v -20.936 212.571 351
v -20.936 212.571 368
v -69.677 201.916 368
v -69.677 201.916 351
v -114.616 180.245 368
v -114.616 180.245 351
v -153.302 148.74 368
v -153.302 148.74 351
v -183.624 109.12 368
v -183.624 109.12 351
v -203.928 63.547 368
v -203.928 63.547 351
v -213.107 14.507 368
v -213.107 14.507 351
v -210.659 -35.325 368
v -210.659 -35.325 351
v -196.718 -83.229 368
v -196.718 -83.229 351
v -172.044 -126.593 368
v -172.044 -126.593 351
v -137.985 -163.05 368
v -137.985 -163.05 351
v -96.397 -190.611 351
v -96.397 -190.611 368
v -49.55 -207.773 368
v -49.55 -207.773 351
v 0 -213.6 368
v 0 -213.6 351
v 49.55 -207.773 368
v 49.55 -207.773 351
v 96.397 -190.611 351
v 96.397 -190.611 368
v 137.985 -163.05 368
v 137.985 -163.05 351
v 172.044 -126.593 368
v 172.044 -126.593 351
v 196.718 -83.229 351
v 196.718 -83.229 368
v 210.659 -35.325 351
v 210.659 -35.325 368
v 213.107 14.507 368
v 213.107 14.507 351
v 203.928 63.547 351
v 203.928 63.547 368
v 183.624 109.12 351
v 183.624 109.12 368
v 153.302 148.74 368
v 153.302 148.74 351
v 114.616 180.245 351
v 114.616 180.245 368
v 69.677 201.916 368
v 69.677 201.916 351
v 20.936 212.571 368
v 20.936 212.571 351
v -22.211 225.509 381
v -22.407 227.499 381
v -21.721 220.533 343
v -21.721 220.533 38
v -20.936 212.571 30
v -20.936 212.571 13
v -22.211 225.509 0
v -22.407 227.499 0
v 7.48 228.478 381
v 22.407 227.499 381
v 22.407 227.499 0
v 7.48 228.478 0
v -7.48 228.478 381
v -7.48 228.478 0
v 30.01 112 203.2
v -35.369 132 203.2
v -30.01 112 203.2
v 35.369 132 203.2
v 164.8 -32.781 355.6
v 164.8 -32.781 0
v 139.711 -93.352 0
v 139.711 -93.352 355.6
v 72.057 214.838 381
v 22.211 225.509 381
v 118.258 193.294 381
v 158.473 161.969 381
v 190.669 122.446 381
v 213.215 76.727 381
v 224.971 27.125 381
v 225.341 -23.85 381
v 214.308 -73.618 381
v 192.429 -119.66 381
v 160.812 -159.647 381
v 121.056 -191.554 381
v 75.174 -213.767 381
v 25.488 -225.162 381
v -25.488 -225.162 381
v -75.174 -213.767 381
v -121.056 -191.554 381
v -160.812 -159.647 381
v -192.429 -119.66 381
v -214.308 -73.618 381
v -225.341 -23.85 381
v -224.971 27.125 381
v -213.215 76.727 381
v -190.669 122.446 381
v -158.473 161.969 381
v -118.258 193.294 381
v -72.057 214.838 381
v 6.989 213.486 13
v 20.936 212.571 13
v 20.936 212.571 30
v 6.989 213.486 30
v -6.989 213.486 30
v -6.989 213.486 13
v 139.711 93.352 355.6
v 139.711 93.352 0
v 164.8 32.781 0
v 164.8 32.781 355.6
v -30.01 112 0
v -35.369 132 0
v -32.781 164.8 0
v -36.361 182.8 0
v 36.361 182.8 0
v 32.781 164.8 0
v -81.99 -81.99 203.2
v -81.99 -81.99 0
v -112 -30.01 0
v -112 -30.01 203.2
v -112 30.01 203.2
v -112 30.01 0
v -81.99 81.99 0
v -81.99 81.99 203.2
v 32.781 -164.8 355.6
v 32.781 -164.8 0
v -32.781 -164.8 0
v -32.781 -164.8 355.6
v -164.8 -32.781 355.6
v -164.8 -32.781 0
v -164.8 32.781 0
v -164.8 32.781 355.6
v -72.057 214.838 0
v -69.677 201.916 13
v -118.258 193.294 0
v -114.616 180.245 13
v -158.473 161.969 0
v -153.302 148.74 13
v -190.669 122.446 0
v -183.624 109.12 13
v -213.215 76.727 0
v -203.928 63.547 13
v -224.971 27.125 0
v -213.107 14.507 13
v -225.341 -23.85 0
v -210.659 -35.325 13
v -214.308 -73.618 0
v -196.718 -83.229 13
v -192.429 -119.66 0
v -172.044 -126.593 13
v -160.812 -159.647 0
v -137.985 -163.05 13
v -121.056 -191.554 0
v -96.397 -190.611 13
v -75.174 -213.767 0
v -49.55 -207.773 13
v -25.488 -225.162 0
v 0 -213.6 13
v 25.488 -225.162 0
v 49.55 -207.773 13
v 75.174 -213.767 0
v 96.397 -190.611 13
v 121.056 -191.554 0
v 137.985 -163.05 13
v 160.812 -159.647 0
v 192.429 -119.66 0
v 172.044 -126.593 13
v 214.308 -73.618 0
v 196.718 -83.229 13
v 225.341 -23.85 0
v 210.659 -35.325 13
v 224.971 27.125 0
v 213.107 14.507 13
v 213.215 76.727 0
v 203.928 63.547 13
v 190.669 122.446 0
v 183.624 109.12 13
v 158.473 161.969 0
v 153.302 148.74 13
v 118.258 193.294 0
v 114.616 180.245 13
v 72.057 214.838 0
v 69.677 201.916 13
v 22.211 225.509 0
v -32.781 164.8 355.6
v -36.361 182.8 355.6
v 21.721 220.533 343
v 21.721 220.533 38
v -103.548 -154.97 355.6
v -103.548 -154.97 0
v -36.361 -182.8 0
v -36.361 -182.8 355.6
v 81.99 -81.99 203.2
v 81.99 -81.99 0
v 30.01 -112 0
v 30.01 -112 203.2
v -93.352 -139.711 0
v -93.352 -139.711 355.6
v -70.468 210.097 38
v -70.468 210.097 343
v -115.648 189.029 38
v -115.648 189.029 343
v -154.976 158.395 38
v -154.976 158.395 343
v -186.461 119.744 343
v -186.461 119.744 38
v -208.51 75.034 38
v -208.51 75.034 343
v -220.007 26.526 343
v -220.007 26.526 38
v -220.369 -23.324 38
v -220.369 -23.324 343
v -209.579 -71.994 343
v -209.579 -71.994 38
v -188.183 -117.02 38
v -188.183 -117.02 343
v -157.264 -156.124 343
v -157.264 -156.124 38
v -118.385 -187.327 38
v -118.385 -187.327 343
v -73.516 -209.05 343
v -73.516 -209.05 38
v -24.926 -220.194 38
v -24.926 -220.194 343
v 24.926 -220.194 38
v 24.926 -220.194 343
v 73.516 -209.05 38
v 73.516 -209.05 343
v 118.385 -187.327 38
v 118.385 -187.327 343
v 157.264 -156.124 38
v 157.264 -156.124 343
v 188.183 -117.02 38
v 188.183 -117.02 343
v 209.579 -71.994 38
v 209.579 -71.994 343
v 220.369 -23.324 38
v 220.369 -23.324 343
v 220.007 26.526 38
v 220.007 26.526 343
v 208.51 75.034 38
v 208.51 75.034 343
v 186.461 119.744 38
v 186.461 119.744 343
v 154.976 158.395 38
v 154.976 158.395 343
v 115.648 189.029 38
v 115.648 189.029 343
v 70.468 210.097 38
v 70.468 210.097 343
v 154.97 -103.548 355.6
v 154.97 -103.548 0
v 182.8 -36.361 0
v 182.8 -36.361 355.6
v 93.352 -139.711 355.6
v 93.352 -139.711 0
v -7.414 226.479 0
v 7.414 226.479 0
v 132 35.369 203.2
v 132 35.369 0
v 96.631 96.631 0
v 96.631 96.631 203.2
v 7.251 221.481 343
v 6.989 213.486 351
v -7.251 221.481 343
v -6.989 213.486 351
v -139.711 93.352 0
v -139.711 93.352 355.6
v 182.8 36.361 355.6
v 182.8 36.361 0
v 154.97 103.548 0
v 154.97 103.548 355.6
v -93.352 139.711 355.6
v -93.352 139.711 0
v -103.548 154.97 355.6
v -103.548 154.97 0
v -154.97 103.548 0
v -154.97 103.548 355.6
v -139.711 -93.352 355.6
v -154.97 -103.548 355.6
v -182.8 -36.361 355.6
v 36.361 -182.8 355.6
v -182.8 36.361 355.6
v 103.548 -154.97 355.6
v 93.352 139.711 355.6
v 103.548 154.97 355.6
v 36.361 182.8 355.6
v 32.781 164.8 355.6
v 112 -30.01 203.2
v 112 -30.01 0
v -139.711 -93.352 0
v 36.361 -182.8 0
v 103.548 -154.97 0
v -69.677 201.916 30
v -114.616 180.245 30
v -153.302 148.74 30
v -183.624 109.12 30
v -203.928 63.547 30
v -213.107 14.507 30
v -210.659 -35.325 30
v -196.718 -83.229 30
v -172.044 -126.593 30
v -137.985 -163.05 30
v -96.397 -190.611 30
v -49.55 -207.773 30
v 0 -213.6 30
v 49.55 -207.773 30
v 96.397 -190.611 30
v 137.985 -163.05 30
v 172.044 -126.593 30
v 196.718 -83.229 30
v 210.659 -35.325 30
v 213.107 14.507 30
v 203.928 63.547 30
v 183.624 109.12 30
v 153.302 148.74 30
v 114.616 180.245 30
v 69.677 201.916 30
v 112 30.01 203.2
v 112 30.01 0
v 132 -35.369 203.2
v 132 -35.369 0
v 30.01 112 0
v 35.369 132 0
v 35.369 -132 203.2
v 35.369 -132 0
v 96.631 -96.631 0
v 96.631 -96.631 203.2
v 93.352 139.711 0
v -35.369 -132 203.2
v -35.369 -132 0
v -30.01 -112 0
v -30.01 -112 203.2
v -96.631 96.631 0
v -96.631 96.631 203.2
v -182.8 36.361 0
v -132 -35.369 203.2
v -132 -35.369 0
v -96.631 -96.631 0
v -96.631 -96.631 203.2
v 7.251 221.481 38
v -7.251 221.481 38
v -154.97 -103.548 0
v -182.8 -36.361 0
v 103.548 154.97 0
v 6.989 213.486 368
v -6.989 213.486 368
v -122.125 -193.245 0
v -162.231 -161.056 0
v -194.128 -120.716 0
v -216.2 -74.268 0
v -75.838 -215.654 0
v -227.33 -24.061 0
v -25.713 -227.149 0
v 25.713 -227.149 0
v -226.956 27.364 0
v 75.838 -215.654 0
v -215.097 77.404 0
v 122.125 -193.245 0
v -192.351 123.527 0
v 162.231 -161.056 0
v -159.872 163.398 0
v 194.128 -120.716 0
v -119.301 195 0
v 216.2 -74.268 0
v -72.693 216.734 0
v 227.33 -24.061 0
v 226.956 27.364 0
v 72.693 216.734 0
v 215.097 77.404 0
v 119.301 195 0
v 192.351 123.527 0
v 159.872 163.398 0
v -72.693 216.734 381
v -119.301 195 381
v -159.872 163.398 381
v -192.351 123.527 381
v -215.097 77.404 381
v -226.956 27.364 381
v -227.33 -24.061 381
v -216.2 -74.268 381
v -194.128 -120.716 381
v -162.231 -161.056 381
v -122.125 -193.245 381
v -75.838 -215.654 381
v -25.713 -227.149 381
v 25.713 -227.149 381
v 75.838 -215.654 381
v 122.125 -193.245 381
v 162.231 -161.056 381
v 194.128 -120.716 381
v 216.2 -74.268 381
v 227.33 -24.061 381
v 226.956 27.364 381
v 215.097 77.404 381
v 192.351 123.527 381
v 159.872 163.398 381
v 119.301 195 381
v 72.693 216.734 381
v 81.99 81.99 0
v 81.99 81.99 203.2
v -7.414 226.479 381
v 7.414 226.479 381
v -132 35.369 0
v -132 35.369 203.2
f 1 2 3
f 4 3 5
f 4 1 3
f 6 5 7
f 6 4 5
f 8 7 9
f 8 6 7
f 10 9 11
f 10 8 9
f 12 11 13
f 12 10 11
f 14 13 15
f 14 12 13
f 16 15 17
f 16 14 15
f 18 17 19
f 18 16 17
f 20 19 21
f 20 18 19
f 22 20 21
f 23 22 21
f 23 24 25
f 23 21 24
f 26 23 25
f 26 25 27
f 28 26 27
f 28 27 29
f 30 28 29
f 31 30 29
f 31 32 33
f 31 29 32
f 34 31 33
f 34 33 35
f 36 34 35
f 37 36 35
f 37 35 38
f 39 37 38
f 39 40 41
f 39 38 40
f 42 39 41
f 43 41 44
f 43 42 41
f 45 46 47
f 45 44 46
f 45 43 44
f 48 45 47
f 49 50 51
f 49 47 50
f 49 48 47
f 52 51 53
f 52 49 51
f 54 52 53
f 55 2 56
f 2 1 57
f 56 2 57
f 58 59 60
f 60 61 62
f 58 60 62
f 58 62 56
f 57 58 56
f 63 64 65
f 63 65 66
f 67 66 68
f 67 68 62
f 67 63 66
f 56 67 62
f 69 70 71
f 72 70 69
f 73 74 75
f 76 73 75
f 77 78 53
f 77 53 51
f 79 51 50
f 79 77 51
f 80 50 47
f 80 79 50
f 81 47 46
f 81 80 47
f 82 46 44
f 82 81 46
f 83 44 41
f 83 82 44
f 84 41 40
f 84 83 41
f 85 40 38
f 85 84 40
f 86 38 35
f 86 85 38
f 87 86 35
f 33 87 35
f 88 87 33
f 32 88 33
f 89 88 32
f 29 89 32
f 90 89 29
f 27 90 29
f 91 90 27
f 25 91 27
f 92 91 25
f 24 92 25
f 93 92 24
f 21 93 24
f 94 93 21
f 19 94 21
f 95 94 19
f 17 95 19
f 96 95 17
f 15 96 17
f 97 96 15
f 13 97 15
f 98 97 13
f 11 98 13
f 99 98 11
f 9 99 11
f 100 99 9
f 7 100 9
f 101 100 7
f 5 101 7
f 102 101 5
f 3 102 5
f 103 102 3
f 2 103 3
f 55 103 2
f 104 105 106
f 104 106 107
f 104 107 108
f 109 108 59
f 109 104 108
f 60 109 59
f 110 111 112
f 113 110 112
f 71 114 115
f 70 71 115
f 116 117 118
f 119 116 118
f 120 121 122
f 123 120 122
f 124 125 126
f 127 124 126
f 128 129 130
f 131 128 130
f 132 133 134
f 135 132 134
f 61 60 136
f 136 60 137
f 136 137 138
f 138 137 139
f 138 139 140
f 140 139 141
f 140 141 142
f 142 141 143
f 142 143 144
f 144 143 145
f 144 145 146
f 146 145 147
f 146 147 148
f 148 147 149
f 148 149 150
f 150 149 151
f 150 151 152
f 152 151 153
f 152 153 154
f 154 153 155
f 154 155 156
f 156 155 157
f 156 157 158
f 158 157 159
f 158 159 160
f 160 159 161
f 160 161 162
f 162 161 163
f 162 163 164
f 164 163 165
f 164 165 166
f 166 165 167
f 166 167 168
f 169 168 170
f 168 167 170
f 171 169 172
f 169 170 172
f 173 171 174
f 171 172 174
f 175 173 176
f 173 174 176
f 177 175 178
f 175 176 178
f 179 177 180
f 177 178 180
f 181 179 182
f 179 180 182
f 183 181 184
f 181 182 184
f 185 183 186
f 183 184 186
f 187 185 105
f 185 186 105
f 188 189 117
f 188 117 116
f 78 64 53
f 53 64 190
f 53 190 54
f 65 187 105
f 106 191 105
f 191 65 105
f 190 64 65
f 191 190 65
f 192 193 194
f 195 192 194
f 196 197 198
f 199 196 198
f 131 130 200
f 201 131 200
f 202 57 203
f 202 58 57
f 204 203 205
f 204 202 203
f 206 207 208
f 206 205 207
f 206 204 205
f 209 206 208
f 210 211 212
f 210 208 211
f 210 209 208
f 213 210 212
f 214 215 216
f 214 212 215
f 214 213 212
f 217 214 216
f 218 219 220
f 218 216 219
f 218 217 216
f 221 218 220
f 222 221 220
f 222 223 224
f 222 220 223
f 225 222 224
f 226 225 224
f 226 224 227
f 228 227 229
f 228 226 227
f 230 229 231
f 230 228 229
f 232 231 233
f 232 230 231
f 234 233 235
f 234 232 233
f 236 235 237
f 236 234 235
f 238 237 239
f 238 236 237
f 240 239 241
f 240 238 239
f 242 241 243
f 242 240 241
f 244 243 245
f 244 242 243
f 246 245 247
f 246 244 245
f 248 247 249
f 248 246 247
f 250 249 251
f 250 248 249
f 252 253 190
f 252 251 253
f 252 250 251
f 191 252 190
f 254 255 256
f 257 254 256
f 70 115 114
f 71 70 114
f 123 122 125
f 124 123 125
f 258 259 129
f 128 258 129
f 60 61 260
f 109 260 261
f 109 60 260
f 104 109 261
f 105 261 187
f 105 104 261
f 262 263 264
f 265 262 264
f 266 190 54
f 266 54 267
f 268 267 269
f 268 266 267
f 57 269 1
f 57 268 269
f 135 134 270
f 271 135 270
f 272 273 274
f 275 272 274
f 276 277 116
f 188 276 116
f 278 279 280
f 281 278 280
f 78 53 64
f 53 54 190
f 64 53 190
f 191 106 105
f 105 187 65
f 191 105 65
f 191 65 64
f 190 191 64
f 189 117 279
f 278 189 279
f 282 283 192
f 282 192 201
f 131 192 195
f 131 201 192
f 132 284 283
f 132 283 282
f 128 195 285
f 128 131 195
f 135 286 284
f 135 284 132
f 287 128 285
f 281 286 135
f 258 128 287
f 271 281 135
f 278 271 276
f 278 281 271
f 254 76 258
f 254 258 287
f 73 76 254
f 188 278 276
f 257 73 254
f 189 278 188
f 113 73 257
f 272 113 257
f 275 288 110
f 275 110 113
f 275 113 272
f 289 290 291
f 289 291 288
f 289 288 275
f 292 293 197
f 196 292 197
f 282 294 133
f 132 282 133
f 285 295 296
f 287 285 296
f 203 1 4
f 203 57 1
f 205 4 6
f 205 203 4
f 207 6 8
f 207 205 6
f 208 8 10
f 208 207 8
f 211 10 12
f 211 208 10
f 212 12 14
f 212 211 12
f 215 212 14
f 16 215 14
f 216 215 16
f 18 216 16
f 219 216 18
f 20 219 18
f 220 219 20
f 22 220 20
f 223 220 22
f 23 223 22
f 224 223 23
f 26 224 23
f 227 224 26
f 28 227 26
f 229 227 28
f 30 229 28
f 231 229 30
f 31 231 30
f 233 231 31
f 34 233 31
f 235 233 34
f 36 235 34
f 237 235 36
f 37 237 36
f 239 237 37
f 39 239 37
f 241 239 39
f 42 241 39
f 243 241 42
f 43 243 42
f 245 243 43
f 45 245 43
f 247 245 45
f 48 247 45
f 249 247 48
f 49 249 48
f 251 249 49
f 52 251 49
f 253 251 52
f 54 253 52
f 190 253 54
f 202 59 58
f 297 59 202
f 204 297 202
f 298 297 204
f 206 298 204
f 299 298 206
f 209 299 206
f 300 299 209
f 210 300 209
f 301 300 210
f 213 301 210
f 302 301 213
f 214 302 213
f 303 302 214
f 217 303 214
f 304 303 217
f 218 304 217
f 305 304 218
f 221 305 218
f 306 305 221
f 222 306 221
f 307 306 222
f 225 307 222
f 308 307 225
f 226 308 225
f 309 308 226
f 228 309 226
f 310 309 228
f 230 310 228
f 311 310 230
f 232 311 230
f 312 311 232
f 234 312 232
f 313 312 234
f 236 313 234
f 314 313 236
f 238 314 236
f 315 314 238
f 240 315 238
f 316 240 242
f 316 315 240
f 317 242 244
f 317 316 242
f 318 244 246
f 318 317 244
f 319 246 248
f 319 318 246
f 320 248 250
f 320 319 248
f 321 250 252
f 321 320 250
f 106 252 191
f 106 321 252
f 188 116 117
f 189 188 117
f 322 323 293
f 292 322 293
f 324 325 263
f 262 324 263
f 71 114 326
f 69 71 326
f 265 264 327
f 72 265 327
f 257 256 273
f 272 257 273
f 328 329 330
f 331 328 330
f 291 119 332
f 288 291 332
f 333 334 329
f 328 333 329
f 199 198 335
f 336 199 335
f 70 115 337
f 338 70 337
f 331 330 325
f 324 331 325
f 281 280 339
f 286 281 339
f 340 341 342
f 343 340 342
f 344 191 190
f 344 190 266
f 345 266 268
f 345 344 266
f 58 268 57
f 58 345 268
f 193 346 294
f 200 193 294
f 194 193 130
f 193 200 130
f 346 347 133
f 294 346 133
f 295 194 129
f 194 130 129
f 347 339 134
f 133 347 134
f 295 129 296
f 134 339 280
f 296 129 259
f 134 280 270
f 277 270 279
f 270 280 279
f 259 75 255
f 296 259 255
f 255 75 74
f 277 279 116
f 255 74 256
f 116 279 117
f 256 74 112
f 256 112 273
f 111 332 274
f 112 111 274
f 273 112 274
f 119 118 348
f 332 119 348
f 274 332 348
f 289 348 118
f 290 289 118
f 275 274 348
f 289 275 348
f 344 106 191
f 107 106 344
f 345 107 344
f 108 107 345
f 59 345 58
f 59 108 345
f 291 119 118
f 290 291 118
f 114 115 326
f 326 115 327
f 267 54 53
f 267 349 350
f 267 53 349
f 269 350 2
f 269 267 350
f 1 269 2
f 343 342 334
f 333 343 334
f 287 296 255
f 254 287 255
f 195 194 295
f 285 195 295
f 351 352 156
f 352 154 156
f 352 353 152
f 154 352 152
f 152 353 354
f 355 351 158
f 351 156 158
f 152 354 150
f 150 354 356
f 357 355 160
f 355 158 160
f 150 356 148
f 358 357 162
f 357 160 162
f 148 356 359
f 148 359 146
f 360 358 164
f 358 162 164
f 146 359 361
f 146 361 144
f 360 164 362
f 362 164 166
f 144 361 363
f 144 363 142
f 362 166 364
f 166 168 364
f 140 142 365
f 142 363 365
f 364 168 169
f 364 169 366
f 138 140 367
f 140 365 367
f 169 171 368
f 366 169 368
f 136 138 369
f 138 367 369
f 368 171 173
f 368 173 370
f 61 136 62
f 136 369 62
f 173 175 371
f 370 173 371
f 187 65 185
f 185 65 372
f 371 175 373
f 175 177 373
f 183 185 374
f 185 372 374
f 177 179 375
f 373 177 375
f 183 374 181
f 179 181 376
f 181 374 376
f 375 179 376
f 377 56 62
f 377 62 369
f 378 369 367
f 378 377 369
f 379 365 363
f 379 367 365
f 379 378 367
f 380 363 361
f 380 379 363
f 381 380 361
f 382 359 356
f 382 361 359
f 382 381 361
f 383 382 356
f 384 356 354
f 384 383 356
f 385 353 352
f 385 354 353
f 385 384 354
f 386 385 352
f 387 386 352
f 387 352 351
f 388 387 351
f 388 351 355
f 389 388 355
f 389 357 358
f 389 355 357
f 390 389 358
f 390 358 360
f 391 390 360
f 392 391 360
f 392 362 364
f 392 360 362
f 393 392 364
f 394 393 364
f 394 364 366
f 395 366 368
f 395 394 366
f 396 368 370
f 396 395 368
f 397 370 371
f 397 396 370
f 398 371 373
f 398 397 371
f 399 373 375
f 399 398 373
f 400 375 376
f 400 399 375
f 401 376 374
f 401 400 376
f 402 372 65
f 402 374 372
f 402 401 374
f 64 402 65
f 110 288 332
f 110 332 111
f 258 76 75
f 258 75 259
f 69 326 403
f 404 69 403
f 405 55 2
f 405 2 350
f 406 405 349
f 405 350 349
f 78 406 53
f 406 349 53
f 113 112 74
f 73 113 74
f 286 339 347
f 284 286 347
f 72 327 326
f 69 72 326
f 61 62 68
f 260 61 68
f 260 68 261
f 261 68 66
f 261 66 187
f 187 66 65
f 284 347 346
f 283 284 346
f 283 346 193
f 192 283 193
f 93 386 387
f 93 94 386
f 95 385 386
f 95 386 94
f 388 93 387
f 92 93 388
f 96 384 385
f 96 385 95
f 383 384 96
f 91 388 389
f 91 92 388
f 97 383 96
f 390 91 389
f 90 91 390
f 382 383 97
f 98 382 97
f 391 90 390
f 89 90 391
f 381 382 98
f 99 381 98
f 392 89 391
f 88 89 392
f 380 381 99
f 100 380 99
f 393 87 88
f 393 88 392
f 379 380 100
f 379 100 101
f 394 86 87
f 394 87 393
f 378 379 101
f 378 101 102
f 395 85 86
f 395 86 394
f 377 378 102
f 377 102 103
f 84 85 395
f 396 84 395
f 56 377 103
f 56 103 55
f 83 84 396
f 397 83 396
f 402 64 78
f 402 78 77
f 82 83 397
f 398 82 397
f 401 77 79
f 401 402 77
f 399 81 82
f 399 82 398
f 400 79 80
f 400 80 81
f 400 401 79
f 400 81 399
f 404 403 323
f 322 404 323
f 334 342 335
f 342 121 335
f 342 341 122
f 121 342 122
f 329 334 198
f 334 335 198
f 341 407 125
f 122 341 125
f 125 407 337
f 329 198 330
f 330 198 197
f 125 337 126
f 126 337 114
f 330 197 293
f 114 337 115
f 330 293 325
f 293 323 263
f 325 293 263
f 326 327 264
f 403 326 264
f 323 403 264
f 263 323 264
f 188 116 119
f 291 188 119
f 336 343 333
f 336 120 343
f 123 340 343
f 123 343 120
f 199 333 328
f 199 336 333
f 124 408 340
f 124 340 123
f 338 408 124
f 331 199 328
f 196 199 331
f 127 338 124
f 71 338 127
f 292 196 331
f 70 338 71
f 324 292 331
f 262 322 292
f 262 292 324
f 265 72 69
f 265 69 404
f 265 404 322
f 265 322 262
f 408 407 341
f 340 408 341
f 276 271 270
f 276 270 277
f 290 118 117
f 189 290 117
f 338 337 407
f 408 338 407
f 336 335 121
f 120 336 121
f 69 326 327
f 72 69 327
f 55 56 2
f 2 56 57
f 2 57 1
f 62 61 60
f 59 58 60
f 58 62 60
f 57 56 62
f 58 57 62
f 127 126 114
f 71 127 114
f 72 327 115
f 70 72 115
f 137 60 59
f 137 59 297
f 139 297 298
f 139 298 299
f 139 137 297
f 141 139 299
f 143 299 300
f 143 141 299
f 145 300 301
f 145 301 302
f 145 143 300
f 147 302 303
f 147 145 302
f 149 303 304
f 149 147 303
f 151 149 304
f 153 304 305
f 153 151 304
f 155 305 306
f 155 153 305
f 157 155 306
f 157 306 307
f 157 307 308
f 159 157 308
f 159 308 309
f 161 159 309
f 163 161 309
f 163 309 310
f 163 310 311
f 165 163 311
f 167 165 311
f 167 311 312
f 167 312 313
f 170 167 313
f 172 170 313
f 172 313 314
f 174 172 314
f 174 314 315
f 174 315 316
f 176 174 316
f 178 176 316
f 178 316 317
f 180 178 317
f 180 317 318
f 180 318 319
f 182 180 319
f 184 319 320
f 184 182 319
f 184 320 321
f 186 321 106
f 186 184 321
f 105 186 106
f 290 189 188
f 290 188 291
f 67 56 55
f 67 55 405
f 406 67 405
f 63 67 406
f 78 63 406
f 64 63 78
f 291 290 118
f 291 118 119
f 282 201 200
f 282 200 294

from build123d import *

# Parameters (mm, degrees)
F1_DEPTH  = 381
F2_DEPTH  = 381
F3_W      = 113.4495702038
F3_H      = 429.2523376644
F5_SIZE   = 13
F5_2_SIZE = 13
F7_DEPTH  = 355.6
F8_DEPTH  = 355.6
F10_DEPTH = 203.2
F11_DEPTH = 203.2


with BuildPart() as f1:
    # F0 (on Top) → F1 (new body)
    with BuildSketch(Plane.XY):
        Polygon((20.4468153369, 207.6), (23.2045746309, 235.6), (-23.2045746309, 235.6), (-20.4468153369, 207.6), align=None)
    extrude(amount=F1_DEPTH)


with BuildPart() as f2:
    # F0 (on Top) → F2 (new body, through all)
    with BuildSketch(Plane.XY):
        Polygon((235.6, 23.2045746309), (226.546024126, 68.7219851031), (208.7860115933, 111.5984482274), (183.0024697236, 150.1862455715), (150.1862455715, 183.0024697236), (111.5984482274, 208.7860115933), (68.7219851031, 226.546024126), (23.2045746309, 235.6), (20.4468153369, 207.6), (60.5546863641, 199.6220484234), (98.3354747538, 183.9727334753), (132.3372859959, 161.2534495528), (161.2534495528, 132.3372859959), (183.9727334753, 98.3354747538), (199.6220484234, 60.5546863641), (207.6, 20.4468153369), (207.6, -20.4468153369), (199.6220484234, -60.5546863641), (183.9727334753, -98.3354747538), (161.2534495528, -132.3372859959), (132.3372859959, -161.2534495528), (98.3354747538, -183.9727334753), (60.5546863641, -199.6220484234), (20.4468153369, -207.6), (-20.4468153369, -207.6), (-60.5546863641, -199.6220484234), (-98.3354747538, -183.9727334753), (-132.3372859959, -161.2534495528), (-161.2534495528, -132.3372859959), (-183.9727334753, -98.3354747538), (-199.6220484234, -60.5546863641), (-207.6, -20.4468153369), (-207.6, 20.4468153369), (-199.6220484234, 60.5546863641), (-183.9727334753, 98.3354747538), (-161.2534495528, 132.3372859959), (-132.3372859959, 161.2534495528), (-98.3354747538, 183.9727334753), (-60.5546863641, 199.6220484234), (-20.4468153369, 207.6), (-23.2045746309, 235.6), (-68.7219851031, 226.546024126), (-111.5984482274, 208.7860115933), (-150.1862455715, 183.0024697236), (-183.0024697236, 150.1862455715), (-208.7860115933, 111.5984482274), (-226.546024126, 68.7219851031), (-235.6, 23.2045746309), (-235.6, -23.2045746309), (-226.546024126, -68.7219851031), (-208.7860115933, -111.5984482274), (-183.0024697236, -150.1862455715), (-150.1862455715, -183.0024697236), (-111.5984482274, -208.7860115933), (-68.7219851031, -226.546024126), (-23.2045746309, -235.6), (23.2045746309, -235.6), (68.7219851031, -226.546024126), (111.5984482274, -208.7860115933), (150.1862455715, -183.0024697236), (183.0024697236, -150.1862455715), (208.7860115933, -111.5984482274), (226.546024126, -68.7219851031), (235.6, -23.2045746309), align=None)
    extrude(amount=F2_DEPTH)


with BuildPart() as f4_tool:
    # F3 (on Front) → F4 (revolve)
    with BuildSketch(Plane.XZ):
        with Locations((-285.3247851019, 178.768913353)):
            Rectangle(F3_W, F3_H)
        Polygon((-213.6, 30), (-213.6, -35.8572554791), (-190.5178142795, -35.8572554791), (-190.5178142795, 393.3950821852), (-213.6, 393.3950821852), (-213.6, 351), (-221.6, 343), (-221.6, 38), align=None)
    revolve(axis=Axis((0, 0, 198.5659504), (0, 0, 1)))


with BuildPart() as f1_1:
    add(f1.part)

    # F4: cut by f4_tool
    add(f4_tool.part, mode=Mode.SUBTRACT)

    # F5#2
    f5_2_edges = [f1_1.edges().sort_by_distance(p)[0] for p in [
        (0, 213.6, 381),
        (0, 213.6, 0),
    ]]
    chamfer(f5_2_edges, length=F5_2_SIZE)


with BuildPart() as f2_1:
    add(f2.part)

    # F4: cut by f4_tool
    add(f4_tool.part, mode=Mode.SUBTRACT)

    # F5
    f5_edges = [f2_1.edges().sort_by_distance(p)[0] for p in [
        (0, -213.6, 381),
        (0, -213.6, 0),
    ]]
    chamfer(f5_edges, length=F5_SIZE)


with BuildPart() as f7:
    # F6 (on Top) → F7 (new body)
    with BuildSketch(Plane.XY):
        Polygon((32.7807581442, 164.8), (36.361180757, 182.8), (-36.361180757, 182.8), (-32.7807581442, 164.8), align=None)
    extrude(amount=F7_DEPTH)


with BuildPart() as f8:
    # F6 (on Top) → F8 (new body, through all)
    with BuildSketch(Plane.XY):
        Polygon((182.8, 36.361180757), (154.9703570861, 103.5478821157), (103.5478821157, 154.9703570861), (36.361180757, 182.8), (32.7807581442, 164.8), (93.3517011634, 139.7106939157), (139.7106939157, 93.3517011634), (164.8, 32.7807581442), (164.8, -32.7807581442), (139.7106939157, -93.3517011634), (93.3517011634, -139.7106939157), (32.7807581442, -164.8), (-32.7807581442, -164.8), (-93.3517011634, -139.7106939157), (-139.7106939157, -93.3517011634), (-164.8, -32.7807581442), (-164.8, 32.7807581442), (-139.7106939157, 93.3517011634), (-93.3517011634, 139.7106939157), (-32.7807581442, 164.8), (-36.361180757, 182.8), (-103.5478821157, 154.9703570861), (-154.9703570861, 103.5478821157), (-182.8, 36.361180757), (-182.8, -36.361180757), (-154.9703570861, -103.5478821157), (-103.5478821157, -154.9703570861), (-36.361180757, -182.8), (36.361180757, -182.8), (103.5478821157, -154.9703570861), (154.9703570861, -103.5478821157), (182.8, -36.361180757), align=None)
    extrude(amount=F8_DEPTH)


with BuildPart() as f10:
    # F9 (on Top) → F10 (new body)
    with BuildSketch(Plane.XY):
        Polygon((30.0103095523, 112), (35.3692934009, 132), (-35.3692934009, 132), (-30.0103095523, 112), align=None)
    extrude(amount=F10_DEPTH)


with BuildPart() as f11:
    # F9 (on Top) → F11 (new body, through all)
    with BuildSketch(Plane.XY):
        Polygon((132, -35.3692934009), (132, 35.3692934009), (96.6307065991, 96.6307065991), (35.3692934009, 132), (30.0103095523, 112), (81.9896904477, 81.9896904477), (112, 30.0103095523), (112, -30.0103095523), (81.9896904477, -81.9896904477), (30.0103095523, -112), (-30.0103095523, -112), (-81.9896904477, -81.9896904477), (-112, -30.0103095523), (-112, 30.0103095523), (-81.9896904477, 81.9896904477), (-30.0103095523, 112), (-35.3692934009, 132), (-96.6307065991, 96.6307065991), (-132, 35.3692934009), (-132, -35.3692934009), (-96.6307065991, -96.6307065991), (-35.3692934009, -132), (35.3692934009, -132), (96.6307065991, -96.6307065991), align=None)
    extrude(amount=F11_DEPTH)


solid = Compound([f1_1.part, f2_1.part, f7.part, f8.part, f10.part, f11.part])
